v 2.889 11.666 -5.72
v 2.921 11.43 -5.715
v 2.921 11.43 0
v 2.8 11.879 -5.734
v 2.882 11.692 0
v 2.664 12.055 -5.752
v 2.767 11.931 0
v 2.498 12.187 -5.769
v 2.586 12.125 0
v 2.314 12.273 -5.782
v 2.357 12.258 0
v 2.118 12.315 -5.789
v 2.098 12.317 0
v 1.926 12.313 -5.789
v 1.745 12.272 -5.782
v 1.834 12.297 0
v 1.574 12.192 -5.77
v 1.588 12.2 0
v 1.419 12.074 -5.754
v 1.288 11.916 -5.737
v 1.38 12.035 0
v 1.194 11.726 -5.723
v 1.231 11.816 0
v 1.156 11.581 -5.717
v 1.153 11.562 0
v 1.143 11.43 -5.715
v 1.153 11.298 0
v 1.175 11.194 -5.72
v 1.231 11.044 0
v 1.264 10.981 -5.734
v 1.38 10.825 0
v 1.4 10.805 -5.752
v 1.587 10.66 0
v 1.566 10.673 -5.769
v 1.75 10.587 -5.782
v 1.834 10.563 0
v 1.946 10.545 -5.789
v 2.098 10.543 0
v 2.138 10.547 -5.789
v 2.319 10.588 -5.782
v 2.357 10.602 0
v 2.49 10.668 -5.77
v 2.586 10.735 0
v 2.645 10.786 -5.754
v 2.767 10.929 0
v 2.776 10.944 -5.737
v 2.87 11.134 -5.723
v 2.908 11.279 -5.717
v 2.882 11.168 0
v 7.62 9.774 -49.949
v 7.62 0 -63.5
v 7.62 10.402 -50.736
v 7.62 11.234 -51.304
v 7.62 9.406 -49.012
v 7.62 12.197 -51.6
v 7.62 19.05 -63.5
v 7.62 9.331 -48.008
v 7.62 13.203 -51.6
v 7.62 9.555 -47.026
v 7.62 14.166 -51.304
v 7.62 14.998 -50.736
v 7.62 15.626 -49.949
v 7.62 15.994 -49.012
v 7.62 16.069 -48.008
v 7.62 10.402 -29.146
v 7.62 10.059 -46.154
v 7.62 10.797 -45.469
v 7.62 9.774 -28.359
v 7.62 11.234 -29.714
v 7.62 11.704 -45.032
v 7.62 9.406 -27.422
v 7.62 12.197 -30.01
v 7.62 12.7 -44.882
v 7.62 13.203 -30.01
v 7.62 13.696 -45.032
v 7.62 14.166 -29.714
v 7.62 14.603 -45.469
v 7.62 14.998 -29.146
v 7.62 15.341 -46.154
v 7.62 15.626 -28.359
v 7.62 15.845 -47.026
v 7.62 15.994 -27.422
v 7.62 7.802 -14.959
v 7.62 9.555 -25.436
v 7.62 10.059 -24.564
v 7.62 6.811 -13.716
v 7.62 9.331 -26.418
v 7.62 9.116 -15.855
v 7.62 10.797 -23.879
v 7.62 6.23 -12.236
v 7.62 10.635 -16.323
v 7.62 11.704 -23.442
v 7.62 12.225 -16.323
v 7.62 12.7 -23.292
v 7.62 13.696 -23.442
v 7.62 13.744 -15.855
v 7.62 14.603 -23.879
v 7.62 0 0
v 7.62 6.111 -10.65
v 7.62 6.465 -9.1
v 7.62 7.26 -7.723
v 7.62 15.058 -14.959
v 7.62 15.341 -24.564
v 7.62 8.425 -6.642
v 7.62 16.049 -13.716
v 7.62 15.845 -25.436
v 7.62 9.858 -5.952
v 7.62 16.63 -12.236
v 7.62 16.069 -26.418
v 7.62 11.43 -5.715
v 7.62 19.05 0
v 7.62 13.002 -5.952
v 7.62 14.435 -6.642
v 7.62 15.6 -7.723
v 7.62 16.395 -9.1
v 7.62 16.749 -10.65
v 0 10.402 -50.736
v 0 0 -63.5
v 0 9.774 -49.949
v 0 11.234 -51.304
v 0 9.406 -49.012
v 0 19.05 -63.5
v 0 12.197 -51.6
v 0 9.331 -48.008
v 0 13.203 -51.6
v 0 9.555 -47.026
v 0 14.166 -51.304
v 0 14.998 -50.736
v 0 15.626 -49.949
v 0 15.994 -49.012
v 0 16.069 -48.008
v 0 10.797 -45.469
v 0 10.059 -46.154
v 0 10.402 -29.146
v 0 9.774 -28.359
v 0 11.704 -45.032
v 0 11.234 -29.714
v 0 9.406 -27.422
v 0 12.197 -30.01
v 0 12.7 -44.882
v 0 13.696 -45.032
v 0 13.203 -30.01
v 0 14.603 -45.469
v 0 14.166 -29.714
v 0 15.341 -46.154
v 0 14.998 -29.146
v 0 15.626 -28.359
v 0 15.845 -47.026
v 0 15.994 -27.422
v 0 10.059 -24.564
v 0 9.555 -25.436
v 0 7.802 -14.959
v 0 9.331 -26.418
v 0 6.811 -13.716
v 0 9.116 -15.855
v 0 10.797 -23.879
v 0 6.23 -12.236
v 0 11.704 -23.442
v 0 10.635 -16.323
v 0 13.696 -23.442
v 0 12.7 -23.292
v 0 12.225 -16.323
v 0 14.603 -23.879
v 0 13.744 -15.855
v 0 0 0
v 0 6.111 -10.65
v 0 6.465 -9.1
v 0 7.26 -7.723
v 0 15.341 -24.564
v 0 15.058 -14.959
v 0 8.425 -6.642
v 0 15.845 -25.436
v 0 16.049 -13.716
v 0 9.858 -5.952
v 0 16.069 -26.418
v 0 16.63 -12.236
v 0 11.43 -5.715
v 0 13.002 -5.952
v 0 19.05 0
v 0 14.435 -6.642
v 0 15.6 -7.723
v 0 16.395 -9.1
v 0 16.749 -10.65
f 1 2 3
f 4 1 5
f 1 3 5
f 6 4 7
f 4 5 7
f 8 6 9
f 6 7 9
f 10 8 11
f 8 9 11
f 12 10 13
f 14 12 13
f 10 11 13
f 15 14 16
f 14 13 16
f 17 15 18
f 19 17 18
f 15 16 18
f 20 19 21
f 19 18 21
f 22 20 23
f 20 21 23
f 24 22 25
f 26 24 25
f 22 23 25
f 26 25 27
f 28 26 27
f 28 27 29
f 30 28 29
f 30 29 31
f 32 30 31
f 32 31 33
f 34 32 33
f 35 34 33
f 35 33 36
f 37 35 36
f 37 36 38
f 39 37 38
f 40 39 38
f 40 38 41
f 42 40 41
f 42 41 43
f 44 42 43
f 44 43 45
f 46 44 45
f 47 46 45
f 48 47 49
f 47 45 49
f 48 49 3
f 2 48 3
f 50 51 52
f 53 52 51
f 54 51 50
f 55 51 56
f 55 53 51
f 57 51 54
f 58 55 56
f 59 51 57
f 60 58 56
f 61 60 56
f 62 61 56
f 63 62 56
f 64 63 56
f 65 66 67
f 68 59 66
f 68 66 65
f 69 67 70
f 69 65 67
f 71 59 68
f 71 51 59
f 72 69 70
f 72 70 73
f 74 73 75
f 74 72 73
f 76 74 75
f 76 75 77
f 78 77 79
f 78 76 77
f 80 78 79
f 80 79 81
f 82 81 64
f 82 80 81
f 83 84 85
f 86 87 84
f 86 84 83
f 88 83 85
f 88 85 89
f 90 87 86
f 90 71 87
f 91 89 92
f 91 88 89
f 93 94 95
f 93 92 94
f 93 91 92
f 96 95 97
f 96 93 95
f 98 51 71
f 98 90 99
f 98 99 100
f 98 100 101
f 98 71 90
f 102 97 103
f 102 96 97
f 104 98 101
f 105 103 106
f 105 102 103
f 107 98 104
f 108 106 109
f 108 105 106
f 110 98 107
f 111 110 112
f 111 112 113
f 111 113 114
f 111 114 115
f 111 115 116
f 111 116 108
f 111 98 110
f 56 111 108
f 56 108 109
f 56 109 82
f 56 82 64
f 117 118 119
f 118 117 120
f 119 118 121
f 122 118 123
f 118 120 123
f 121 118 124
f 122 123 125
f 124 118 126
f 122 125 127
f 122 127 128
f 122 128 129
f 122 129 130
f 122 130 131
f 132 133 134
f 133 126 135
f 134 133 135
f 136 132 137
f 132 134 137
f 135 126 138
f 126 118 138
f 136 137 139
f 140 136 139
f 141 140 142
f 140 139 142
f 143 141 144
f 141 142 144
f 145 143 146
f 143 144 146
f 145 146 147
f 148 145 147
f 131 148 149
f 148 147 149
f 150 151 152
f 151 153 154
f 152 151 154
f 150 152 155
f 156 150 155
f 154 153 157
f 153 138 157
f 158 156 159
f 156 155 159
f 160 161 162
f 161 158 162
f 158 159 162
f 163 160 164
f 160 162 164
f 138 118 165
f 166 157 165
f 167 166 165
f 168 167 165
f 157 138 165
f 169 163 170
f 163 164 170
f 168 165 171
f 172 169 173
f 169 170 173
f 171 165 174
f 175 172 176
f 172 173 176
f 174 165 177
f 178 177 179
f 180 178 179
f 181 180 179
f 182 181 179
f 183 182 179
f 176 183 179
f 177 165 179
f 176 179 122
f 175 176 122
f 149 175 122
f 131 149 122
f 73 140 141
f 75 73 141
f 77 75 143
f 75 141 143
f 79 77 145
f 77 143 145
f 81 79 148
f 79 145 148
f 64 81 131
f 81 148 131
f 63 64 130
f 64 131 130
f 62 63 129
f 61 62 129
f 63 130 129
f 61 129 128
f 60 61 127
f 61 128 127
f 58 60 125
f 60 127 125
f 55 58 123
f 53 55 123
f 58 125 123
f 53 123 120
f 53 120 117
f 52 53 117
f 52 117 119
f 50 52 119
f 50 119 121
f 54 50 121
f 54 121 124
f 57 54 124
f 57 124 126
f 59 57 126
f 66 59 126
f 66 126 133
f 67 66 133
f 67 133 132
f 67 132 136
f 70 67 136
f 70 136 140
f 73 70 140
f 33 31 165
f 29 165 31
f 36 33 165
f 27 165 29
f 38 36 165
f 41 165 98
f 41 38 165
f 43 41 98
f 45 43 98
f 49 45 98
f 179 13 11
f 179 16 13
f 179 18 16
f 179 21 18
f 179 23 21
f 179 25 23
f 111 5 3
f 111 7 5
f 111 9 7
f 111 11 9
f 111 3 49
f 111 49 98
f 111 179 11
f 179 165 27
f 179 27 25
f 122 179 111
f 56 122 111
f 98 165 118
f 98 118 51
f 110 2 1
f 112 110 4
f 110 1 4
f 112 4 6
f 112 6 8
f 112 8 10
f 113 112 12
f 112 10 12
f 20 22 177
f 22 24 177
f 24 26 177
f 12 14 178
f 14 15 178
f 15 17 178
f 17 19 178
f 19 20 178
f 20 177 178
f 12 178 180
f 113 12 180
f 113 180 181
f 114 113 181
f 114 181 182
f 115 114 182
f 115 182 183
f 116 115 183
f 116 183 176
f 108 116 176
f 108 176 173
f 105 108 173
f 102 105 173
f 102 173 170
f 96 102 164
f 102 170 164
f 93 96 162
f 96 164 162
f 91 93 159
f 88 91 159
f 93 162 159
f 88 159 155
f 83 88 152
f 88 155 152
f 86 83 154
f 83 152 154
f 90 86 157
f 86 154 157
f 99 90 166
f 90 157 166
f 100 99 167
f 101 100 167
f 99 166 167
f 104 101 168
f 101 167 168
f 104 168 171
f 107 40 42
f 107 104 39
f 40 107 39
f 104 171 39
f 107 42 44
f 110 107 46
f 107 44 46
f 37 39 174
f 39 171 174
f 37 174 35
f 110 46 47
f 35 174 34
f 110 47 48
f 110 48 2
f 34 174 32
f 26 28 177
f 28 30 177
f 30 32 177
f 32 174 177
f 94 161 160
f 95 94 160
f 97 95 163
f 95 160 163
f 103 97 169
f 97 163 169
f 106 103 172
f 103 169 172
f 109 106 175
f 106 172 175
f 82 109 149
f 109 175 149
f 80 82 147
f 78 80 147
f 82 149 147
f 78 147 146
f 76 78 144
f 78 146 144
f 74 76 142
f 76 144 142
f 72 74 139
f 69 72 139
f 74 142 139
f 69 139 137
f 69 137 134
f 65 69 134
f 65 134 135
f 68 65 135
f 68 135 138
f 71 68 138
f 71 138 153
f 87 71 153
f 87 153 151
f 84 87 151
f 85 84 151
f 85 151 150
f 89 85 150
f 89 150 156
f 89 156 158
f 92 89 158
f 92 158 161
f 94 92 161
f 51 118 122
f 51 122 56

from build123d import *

# Parameters (mm, degrees)
SKETCH1_W           = 7.62
SKETCH1_H           = 19.05
BOSS_EXTRUDE1_DEPTH = 63.5
SKETCH2_R           = 0.889
CUT_EXTRUDE1_DEPTH  = 6.35
SKETCH3_R           = 3.3782
CUT_EXTRUDE2_DEPTH  = 8.62
SKETCH4_R           = 3.3782
CUT_EXTRUDE3_DEPTH  = 8.62
SKETCH5_R           = 5.334
CUT_EXTRUDE4_DEPTH  = 8.62


with BuildPart() as part:
    # Sketch1 → Boss-Extrude1 (new body)
    with BuildSketch(Plane.XY):
        with Locations((3.81, 9.525)):
            Rectangle(SKETCH1_W, SKETCH1_H)
    extrude(amount=-BOSS_EXTRUDE1_DEPTH)

    # Sketch2 → Cut-Extrude1 (cut)
    with BuildSketch(Plane.XY):
        with Locations((2.032, 11.43)):
            Circle(SKETCH2_R)
    extrude(amount=-CUT_EXTRUDE1_DEPTH, mode=Mode.SUBTRACT)

    # Sketch3 → Cut-Extrude2 (cut, through all)
    with BuildSketch(Plane.ZY):
        with Locations((-48.26, 12.7)):
            Circle(SKETCH3_R)
    extrude(amount=-CUT_EXTRUDE2_DEPTH, mode=Mode.SUBTRACT)

    # Sketch4 → Cut-Extrude3 (cut, through all)
    with BuildSketch(Plane.ZY):
        with Locations((-26.67, 12.7)):
            Circle(SKETCH4_R)
    extrude(amount=-CUT_EXTRUDE3_DEPTH, mode=Mode.SUBTRACT)

    # Sketch5 → Cut-Extrude4 (cut, through all)
    with BuildSketch(Plane.ZY):
        with Locations((-11.049, 11.43)):
            Circle(SKETCH5_R)
    extrude(amount=-CUT_EXTRUDE4_DEPTH, mode=Mode.SUBTRACT)


solid = part.part
